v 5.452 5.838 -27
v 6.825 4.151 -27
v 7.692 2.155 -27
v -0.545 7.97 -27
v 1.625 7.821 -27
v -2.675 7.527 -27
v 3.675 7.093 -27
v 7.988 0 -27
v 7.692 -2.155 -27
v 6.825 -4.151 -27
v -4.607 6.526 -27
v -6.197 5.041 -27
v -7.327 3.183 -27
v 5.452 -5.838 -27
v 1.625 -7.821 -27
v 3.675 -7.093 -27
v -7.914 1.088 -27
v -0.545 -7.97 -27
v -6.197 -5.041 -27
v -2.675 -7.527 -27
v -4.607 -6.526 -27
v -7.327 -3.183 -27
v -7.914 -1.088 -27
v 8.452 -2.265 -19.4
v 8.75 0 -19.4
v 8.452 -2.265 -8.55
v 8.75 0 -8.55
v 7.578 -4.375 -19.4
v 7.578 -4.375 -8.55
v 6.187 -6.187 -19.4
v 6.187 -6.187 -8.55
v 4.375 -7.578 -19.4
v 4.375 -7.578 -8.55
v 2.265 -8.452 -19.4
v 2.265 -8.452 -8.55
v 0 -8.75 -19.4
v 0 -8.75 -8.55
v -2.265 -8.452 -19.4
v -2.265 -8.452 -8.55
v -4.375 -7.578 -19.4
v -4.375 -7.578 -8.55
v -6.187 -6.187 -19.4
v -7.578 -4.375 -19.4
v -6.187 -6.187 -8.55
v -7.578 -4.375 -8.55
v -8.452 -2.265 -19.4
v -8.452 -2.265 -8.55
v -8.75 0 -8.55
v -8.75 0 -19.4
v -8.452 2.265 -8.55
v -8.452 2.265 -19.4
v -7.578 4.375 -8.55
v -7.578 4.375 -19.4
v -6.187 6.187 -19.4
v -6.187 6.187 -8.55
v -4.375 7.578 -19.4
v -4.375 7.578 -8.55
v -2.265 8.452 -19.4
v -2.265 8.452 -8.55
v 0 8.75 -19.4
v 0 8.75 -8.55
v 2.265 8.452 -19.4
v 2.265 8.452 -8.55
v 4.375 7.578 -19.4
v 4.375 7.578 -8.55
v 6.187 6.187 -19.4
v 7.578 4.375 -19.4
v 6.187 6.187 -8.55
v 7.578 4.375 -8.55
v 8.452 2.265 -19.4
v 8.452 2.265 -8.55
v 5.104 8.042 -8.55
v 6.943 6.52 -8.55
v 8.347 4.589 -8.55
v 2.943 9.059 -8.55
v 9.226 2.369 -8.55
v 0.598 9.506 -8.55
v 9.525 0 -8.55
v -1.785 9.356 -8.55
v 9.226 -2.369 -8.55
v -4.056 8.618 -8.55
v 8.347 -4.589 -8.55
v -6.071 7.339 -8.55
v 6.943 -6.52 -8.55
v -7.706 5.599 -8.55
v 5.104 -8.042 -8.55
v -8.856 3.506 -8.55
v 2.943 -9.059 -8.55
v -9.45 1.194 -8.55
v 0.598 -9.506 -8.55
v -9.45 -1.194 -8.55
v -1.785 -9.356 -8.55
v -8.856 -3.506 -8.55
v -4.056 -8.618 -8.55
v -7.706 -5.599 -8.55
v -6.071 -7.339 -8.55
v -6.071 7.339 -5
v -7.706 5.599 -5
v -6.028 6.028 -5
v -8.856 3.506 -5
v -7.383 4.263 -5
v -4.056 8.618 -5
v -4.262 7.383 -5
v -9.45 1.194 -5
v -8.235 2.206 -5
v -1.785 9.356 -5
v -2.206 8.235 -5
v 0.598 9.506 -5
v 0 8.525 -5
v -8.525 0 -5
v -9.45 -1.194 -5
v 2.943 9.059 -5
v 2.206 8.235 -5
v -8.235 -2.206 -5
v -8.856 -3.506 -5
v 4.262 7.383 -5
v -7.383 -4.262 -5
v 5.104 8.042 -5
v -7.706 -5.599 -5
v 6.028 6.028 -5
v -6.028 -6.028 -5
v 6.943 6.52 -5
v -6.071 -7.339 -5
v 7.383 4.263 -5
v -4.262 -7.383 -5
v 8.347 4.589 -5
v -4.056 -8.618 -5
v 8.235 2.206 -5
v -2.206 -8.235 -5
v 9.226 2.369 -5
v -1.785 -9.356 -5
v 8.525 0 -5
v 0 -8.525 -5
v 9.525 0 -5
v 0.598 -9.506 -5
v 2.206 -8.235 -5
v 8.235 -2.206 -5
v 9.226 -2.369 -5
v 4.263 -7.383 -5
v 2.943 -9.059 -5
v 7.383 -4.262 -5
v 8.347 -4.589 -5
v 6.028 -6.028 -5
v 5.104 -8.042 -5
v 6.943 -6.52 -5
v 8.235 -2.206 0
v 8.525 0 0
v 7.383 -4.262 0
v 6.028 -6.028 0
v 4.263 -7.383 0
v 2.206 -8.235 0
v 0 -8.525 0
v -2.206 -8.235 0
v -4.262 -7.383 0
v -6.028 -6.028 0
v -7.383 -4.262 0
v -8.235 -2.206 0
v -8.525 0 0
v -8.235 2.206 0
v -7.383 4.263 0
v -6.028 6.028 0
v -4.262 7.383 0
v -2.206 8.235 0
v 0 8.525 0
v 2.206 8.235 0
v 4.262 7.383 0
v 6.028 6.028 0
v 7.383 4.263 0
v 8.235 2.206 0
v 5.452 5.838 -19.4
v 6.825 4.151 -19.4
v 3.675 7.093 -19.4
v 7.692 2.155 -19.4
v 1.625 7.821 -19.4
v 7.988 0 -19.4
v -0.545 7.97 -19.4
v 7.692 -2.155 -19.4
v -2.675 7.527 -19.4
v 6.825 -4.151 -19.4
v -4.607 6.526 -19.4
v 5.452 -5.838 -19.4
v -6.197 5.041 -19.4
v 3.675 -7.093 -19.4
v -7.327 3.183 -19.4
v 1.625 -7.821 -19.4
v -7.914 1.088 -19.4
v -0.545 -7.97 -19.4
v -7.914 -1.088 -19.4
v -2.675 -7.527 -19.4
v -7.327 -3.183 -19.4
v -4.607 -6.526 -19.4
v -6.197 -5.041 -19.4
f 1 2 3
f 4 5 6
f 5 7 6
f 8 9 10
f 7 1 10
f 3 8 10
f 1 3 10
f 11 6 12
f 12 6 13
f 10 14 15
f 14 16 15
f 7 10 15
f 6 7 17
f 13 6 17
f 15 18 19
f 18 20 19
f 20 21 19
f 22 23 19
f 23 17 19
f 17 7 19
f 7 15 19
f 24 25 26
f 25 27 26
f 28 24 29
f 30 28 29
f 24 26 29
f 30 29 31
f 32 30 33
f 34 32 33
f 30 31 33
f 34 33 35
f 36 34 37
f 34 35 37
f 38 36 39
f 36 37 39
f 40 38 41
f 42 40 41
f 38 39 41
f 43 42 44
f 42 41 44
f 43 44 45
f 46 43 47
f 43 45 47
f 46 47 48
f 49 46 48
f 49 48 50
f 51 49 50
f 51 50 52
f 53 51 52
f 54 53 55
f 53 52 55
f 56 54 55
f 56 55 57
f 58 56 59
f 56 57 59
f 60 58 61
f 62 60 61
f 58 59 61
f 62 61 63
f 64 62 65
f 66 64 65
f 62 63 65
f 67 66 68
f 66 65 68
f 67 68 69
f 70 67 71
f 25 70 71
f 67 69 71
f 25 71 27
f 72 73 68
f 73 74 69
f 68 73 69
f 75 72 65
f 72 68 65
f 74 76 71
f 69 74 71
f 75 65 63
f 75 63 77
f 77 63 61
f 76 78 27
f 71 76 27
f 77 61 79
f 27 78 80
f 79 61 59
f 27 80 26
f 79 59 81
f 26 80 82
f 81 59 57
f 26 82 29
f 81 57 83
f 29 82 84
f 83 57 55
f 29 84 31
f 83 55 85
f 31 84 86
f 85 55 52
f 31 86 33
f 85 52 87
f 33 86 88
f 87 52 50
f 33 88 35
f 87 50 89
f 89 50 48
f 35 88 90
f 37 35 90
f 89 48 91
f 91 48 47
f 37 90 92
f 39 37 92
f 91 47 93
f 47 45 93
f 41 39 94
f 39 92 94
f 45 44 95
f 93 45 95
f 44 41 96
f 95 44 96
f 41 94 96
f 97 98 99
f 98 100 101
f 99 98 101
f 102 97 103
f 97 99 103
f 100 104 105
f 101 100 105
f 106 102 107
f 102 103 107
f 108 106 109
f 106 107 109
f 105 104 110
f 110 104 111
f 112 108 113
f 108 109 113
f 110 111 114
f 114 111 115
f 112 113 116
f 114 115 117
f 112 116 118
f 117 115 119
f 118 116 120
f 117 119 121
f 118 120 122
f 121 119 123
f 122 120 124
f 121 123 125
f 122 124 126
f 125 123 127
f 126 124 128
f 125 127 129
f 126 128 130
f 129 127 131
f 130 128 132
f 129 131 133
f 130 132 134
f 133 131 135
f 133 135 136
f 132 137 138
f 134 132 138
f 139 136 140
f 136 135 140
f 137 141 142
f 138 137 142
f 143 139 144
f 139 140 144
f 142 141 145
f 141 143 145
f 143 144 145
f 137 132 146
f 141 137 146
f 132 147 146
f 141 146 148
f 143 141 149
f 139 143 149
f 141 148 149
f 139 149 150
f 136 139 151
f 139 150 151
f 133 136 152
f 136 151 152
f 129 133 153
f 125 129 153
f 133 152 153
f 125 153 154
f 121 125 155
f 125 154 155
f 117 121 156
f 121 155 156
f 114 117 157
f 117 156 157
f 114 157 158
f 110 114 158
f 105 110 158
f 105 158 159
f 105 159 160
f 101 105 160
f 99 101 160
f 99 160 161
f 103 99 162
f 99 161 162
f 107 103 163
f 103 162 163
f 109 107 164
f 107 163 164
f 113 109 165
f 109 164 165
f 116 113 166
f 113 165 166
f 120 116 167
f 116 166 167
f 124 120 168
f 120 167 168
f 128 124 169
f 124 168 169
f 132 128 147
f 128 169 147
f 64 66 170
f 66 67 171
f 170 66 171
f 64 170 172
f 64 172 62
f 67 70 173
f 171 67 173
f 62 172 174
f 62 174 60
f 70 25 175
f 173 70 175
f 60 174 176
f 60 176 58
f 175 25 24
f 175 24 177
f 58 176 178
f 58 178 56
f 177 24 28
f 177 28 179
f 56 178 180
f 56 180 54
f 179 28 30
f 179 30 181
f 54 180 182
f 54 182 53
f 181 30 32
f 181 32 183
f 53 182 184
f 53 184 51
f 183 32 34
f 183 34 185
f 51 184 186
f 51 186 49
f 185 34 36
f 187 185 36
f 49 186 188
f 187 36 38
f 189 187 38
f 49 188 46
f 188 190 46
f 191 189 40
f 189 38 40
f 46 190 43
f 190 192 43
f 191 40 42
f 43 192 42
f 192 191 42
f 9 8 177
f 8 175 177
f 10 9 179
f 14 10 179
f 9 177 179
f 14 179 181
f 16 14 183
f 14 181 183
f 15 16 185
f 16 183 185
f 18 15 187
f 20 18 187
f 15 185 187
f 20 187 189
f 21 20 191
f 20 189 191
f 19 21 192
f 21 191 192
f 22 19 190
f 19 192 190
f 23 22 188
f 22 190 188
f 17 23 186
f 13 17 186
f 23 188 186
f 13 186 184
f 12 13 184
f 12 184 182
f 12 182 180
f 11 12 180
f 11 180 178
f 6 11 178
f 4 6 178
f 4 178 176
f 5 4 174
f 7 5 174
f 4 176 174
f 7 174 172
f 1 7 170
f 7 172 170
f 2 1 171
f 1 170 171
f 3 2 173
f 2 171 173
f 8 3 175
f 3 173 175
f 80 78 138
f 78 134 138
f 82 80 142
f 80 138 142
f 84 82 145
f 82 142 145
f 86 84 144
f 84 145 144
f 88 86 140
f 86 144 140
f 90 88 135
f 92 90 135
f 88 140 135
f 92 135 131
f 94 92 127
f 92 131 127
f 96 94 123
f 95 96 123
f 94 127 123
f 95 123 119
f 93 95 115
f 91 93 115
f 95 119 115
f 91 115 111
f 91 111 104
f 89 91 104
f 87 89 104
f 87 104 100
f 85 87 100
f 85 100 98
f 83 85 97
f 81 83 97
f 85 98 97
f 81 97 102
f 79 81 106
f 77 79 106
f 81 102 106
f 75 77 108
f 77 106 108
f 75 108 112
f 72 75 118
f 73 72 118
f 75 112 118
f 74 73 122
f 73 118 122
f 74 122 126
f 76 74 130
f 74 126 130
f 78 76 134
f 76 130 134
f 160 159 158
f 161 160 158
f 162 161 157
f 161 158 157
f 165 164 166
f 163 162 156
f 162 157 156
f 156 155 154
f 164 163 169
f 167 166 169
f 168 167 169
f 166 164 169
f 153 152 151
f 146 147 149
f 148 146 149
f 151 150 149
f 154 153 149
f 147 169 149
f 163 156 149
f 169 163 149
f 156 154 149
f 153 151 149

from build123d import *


with BuildPart() as part:
    # Croquis1 → Revolución1 (revolve)
    with BuildSketch(Plane(origin=(0, 0, 0), x_dir=(0, 0, -1), z_dir=(1, 0, 0)), mode=Mode.PRIVATE) as revoluci_n1_sk:
        Polygon((0, 0), (27, 0), (27, 7.9883), (19.4, 7.9883), (19.4, 8.75), (8.55, 8.75), (8.55, 9.525), (5, 9.525), (5, 8.525), (0, 8.525), align=None)
    revolve(revoluci_n1_sk.sketch.rotate(Axis((0, 0, 0), (0, 0, -1)), 90), axis=Axis((0, 0, 0), (0, 0, -1)))


solid = part.part
